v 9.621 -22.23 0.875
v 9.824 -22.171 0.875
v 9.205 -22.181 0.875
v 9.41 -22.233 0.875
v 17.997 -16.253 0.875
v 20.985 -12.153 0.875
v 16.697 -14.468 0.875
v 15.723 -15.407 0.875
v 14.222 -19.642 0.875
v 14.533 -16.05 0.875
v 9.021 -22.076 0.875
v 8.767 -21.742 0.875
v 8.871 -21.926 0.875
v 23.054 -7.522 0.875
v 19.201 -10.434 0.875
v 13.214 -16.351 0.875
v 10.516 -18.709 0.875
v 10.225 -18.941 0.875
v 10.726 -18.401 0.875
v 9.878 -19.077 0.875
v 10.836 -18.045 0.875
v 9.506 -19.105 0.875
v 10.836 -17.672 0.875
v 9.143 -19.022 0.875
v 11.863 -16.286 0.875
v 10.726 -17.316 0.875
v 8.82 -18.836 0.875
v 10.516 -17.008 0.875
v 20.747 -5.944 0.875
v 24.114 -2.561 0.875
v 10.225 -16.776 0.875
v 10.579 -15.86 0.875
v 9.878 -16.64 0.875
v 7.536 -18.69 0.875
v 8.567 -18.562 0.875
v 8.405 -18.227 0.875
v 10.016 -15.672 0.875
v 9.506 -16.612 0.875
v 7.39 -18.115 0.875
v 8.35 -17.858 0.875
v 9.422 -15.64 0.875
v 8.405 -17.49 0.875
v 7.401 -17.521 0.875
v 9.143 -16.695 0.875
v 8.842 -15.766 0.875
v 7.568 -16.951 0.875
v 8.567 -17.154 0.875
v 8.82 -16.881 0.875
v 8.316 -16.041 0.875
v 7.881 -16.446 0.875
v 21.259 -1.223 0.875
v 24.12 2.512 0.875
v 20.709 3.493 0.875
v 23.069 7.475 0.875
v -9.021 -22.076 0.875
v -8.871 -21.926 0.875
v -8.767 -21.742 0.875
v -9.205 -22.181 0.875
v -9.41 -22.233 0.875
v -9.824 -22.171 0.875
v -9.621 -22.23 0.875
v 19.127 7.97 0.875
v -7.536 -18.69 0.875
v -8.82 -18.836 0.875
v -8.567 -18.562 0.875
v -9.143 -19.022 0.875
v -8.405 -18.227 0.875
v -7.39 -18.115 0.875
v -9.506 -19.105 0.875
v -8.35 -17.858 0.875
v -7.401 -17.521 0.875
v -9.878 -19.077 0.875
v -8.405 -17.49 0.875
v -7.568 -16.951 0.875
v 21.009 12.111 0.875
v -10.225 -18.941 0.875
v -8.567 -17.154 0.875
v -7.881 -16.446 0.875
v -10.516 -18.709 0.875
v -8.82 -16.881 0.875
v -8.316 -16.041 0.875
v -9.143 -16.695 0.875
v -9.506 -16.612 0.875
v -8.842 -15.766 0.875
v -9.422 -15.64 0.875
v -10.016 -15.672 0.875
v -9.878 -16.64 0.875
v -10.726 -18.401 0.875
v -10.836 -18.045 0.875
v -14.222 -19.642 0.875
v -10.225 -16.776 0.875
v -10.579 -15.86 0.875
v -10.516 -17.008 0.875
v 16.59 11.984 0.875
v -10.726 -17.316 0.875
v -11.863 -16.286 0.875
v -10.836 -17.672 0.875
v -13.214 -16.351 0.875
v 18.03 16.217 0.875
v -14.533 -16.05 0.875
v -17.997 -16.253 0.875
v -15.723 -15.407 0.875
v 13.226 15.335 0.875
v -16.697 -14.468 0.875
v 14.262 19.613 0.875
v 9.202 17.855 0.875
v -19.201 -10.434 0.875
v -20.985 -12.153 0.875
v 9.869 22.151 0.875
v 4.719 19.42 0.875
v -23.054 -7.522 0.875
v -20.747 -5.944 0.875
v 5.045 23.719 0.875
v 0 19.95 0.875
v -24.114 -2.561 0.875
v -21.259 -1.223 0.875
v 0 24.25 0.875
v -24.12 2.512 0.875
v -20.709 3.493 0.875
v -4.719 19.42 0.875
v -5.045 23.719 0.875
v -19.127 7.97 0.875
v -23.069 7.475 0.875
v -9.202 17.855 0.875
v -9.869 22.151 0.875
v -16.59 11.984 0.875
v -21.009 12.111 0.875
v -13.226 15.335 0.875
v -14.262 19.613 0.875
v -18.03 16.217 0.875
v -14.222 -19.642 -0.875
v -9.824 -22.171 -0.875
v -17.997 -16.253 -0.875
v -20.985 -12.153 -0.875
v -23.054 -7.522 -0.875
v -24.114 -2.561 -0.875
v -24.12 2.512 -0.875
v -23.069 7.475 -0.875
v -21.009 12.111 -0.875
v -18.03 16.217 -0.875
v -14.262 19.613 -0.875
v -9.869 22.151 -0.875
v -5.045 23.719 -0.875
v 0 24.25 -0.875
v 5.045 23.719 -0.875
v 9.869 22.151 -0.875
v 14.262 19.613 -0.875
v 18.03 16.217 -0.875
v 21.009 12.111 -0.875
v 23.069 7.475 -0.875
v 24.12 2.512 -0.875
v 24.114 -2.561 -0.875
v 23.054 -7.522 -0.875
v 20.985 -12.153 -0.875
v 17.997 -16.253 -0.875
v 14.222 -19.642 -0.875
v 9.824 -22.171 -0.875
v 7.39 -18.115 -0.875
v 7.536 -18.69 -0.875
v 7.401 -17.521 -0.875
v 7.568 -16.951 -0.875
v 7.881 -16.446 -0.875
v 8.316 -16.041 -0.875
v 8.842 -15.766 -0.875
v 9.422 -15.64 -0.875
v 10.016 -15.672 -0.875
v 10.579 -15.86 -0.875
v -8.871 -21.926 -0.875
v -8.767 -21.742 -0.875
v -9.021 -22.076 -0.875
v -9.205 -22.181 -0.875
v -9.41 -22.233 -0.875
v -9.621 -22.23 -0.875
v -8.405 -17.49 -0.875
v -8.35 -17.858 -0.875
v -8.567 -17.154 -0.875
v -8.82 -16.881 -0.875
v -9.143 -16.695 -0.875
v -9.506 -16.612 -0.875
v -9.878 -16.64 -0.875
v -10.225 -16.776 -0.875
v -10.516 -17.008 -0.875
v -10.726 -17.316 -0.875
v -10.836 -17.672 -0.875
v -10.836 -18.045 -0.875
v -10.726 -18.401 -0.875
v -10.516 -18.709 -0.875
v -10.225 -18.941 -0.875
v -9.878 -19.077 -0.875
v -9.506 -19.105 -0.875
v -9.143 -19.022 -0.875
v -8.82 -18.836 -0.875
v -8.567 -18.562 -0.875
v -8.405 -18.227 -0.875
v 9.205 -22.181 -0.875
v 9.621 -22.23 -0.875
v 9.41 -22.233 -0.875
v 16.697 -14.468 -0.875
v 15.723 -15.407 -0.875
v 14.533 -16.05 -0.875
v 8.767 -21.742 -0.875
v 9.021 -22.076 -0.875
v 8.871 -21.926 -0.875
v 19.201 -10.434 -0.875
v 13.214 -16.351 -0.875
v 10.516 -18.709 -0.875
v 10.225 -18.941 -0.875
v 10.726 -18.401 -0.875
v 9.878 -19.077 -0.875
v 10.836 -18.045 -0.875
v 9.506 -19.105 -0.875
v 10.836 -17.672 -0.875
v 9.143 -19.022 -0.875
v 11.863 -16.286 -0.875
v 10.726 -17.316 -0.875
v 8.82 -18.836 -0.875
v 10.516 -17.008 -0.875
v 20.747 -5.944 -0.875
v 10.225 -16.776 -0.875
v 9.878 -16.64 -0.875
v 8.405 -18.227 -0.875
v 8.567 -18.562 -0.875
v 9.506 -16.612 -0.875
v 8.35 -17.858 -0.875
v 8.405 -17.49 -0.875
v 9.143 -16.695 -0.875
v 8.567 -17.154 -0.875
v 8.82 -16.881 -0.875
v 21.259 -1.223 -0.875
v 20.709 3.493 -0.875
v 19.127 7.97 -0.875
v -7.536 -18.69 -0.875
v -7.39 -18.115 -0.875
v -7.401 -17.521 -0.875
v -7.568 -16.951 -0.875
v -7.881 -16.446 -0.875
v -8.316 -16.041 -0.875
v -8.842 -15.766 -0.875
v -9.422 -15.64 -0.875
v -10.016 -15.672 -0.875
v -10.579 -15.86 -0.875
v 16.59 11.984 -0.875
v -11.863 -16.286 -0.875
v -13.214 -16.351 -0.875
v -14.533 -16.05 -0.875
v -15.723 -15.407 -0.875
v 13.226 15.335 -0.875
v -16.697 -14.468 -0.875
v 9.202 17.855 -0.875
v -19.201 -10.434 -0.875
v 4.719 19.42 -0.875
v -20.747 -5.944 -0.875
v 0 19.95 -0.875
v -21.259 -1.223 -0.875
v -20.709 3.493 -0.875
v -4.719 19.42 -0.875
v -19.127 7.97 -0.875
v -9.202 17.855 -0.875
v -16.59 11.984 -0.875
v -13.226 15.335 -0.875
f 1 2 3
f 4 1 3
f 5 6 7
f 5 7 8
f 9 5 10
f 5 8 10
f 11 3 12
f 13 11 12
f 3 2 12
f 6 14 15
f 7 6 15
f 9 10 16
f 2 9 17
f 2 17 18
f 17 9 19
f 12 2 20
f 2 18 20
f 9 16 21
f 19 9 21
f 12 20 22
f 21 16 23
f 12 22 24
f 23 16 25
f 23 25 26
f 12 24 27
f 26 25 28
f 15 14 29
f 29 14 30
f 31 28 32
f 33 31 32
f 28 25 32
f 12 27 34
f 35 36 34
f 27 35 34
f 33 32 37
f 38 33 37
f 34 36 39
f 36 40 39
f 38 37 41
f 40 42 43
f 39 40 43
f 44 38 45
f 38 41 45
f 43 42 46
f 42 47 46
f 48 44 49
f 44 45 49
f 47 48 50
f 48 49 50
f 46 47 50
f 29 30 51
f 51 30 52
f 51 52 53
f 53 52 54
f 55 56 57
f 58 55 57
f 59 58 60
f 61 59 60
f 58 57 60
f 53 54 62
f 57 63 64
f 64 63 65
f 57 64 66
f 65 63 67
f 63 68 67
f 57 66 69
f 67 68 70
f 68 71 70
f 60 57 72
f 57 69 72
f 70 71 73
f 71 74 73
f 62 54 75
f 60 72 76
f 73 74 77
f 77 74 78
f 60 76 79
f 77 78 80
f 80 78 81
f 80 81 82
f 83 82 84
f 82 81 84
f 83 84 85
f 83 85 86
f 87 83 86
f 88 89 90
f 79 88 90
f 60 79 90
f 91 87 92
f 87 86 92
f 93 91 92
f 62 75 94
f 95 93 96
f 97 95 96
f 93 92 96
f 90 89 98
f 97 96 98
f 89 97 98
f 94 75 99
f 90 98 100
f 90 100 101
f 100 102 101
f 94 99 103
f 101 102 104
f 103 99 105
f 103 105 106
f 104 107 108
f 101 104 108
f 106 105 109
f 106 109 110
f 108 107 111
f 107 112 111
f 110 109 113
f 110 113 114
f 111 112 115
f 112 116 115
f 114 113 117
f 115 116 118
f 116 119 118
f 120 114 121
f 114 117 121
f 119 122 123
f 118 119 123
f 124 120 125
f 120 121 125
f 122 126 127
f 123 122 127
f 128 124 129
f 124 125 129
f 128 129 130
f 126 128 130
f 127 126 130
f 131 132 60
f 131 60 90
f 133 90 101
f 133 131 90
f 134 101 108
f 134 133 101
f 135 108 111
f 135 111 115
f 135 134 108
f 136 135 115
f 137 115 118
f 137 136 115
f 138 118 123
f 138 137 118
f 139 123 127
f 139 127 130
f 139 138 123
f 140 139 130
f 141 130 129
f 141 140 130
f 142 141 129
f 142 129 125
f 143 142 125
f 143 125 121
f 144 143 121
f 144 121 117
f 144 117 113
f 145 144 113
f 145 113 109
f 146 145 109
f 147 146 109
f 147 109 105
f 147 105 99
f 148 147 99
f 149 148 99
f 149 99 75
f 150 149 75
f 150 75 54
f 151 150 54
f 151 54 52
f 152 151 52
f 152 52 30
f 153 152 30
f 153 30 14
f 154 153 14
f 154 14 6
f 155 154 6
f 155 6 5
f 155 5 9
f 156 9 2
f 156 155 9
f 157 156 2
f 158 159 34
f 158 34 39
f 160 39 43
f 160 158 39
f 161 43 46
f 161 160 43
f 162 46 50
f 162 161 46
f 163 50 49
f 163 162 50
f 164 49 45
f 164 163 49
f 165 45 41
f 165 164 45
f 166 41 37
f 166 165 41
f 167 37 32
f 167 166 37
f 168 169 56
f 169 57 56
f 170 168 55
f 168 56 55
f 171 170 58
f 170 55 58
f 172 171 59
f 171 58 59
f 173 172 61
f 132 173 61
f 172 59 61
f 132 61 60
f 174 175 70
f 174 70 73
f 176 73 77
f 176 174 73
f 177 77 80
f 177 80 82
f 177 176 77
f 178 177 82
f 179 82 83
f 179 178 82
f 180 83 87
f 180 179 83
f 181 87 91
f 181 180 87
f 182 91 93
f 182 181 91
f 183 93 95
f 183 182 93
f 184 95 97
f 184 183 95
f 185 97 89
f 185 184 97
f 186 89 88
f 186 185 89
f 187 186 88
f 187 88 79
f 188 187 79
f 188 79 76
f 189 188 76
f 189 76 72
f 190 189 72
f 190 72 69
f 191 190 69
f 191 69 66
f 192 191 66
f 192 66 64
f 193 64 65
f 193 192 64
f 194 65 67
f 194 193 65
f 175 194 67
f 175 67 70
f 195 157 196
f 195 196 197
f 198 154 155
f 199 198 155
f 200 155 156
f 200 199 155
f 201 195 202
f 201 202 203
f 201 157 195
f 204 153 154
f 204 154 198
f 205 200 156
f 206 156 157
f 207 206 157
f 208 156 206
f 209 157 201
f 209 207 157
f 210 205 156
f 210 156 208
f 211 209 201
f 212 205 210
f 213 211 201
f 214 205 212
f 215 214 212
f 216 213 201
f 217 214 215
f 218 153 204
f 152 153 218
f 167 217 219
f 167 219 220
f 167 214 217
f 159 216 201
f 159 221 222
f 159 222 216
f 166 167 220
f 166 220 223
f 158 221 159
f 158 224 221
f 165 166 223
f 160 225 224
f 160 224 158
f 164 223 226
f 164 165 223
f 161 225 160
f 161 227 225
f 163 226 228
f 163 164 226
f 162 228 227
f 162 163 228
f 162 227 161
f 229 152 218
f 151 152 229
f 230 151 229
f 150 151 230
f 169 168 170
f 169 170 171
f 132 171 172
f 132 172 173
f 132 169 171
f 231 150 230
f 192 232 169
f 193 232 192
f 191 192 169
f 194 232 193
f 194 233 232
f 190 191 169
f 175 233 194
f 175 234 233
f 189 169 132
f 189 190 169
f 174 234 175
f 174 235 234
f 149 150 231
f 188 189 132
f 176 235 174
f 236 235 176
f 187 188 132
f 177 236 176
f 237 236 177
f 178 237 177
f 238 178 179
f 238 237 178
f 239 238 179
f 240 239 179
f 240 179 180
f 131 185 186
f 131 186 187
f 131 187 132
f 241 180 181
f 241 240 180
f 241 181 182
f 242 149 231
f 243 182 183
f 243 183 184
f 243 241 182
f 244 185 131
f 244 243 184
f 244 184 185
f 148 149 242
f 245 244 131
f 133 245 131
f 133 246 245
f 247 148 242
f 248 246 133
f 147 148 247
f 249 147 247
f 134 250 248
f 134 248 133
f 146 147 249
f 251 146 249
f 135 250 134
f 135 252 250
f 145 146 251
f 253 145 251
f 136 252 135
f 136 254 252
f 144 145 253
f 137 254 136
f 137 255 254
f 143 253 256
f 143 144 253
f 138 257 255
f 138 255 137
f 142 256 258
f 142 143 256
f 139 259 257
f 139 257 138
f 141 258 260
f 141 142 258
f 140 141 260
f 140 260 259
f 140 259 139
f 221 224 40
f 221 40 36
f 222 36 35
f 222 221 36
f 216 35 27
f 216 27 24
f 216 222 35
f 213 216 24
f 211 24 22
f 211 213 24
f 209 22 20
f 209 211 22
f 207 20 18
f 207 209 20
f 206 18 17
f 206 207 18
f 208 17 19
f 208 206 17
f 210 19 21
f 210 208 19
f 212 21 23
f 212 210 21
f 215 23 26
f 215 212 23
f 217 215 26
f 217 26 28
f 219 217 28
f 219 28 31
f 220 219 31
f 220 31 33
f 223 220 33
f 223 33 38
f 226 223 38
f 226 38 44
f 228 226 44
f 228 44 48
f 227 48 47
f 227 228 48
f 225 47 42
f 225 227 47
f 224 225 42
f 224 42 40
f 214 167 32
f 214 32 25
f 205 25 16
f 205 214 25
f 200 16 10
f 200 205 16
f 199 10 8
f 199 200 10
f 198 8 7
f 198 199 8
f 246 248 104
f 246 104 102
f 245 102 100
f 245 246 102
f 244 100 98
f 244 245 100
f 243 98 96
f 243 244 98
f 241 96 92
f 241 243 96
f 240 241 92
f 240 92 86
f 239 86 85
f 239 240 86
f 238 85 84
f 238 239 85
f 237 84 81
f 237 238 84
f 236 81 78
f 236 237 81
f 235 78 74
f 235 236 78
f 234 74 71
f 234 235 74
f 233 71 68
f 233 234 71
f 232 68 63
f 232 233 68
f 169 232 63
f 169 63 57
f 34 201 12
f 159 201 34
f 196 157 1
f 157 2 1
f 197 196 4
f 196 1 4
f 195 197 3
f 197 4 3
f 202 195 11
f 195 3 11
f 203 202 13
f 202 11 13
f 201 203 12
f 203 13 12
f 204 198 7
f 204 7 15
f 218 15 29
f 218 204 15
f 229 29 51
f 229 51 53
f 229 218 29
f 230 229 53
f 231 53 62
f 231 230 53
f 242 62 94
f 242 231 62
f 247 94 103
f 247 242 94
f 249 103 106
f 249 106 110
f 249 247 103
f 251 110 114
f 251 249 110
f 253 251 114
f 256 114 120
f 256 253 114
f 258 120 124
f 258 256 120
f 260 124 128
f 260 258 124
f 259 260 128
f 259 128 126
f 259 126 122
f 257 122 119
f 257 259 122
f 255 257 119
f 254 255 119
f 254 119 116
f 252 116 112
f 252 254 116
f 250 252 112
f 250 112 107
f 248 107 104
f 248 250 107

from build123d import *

# Parameters (mm, degrees)
BOSS_EXTRUDE1_DEPTH      = 0.875
BOSS_EXTRUDE1_DEPTH_BACK = 0.875
SKETCH3_R                = 1.25
FILLET1_R                = 0.79375


with BuildPart() as part:
    # Sketch3 → Boss-Extrude1 (new, two sides: drawn at the far end of the back side and taken through both)
    with BuildSketch(Plane.XY.offset(-BOSS_EXTRUDE1_DEPTH_BACK)):
        with BuildLine():
            Line((-7.536269642, -18.690362219), (-9.068559557, -22.490525284))
            ThreePointArc((-9.068559557, -22.490525284), (0, 24.25), (9.068559557, -22.490525284))
            Line((9.068559557, -22.490525284), (7.536269642, -18.690362219))
            ThreePointArc((7.536269642, -18.690362219), (8.084526994, -16.229043526), (10.57907226, -15.860370565))
            ThreePointArc((10.57907226, -15.860370565), (13.884078483, -16.245316894), (16.696841294, -14.467786253))
            ThreePointArc((16.696841294, -14.467786253), (0, 19.95), (-16.696841294, -14.467786253))
            ThreePointArc((-16.696841294, -14.467786253), (-13.884078483, -16.245316894), (-10.57907226, -15.860370565))
            ThreePointArc((-10.57907226, -15.860370565), (-8.084526994, -16.229043526), (-7.536269642, -18.690362219))
        make_face()
        with Locations((-9.599833302, -17.858298507)):
            Circle(SKETCH3_R, mode=Mode.SUBTRACT)
        with Locations(Location((9.599833302, -17.858298507, 0), (0, 0, 180))):
            Circle(SKETCH3_R, mode=Mode.SUBTRACT)
    extrude(amount=BOSS_EXTRUDE1_DEPTH + BOSS_EXTRUDE1_DEPTH_BACK)

    # Fillet1
    fillet1_edges = [part.edges().sort_by_distance(p)[0] for p in [
        (9.068559557, -22.490525284, 0),
        (-9.068559557, -22.490525284, 0),
    ]]
    fillet(fillet1_edges, radius=FILLET1_R)


solid = part.part
